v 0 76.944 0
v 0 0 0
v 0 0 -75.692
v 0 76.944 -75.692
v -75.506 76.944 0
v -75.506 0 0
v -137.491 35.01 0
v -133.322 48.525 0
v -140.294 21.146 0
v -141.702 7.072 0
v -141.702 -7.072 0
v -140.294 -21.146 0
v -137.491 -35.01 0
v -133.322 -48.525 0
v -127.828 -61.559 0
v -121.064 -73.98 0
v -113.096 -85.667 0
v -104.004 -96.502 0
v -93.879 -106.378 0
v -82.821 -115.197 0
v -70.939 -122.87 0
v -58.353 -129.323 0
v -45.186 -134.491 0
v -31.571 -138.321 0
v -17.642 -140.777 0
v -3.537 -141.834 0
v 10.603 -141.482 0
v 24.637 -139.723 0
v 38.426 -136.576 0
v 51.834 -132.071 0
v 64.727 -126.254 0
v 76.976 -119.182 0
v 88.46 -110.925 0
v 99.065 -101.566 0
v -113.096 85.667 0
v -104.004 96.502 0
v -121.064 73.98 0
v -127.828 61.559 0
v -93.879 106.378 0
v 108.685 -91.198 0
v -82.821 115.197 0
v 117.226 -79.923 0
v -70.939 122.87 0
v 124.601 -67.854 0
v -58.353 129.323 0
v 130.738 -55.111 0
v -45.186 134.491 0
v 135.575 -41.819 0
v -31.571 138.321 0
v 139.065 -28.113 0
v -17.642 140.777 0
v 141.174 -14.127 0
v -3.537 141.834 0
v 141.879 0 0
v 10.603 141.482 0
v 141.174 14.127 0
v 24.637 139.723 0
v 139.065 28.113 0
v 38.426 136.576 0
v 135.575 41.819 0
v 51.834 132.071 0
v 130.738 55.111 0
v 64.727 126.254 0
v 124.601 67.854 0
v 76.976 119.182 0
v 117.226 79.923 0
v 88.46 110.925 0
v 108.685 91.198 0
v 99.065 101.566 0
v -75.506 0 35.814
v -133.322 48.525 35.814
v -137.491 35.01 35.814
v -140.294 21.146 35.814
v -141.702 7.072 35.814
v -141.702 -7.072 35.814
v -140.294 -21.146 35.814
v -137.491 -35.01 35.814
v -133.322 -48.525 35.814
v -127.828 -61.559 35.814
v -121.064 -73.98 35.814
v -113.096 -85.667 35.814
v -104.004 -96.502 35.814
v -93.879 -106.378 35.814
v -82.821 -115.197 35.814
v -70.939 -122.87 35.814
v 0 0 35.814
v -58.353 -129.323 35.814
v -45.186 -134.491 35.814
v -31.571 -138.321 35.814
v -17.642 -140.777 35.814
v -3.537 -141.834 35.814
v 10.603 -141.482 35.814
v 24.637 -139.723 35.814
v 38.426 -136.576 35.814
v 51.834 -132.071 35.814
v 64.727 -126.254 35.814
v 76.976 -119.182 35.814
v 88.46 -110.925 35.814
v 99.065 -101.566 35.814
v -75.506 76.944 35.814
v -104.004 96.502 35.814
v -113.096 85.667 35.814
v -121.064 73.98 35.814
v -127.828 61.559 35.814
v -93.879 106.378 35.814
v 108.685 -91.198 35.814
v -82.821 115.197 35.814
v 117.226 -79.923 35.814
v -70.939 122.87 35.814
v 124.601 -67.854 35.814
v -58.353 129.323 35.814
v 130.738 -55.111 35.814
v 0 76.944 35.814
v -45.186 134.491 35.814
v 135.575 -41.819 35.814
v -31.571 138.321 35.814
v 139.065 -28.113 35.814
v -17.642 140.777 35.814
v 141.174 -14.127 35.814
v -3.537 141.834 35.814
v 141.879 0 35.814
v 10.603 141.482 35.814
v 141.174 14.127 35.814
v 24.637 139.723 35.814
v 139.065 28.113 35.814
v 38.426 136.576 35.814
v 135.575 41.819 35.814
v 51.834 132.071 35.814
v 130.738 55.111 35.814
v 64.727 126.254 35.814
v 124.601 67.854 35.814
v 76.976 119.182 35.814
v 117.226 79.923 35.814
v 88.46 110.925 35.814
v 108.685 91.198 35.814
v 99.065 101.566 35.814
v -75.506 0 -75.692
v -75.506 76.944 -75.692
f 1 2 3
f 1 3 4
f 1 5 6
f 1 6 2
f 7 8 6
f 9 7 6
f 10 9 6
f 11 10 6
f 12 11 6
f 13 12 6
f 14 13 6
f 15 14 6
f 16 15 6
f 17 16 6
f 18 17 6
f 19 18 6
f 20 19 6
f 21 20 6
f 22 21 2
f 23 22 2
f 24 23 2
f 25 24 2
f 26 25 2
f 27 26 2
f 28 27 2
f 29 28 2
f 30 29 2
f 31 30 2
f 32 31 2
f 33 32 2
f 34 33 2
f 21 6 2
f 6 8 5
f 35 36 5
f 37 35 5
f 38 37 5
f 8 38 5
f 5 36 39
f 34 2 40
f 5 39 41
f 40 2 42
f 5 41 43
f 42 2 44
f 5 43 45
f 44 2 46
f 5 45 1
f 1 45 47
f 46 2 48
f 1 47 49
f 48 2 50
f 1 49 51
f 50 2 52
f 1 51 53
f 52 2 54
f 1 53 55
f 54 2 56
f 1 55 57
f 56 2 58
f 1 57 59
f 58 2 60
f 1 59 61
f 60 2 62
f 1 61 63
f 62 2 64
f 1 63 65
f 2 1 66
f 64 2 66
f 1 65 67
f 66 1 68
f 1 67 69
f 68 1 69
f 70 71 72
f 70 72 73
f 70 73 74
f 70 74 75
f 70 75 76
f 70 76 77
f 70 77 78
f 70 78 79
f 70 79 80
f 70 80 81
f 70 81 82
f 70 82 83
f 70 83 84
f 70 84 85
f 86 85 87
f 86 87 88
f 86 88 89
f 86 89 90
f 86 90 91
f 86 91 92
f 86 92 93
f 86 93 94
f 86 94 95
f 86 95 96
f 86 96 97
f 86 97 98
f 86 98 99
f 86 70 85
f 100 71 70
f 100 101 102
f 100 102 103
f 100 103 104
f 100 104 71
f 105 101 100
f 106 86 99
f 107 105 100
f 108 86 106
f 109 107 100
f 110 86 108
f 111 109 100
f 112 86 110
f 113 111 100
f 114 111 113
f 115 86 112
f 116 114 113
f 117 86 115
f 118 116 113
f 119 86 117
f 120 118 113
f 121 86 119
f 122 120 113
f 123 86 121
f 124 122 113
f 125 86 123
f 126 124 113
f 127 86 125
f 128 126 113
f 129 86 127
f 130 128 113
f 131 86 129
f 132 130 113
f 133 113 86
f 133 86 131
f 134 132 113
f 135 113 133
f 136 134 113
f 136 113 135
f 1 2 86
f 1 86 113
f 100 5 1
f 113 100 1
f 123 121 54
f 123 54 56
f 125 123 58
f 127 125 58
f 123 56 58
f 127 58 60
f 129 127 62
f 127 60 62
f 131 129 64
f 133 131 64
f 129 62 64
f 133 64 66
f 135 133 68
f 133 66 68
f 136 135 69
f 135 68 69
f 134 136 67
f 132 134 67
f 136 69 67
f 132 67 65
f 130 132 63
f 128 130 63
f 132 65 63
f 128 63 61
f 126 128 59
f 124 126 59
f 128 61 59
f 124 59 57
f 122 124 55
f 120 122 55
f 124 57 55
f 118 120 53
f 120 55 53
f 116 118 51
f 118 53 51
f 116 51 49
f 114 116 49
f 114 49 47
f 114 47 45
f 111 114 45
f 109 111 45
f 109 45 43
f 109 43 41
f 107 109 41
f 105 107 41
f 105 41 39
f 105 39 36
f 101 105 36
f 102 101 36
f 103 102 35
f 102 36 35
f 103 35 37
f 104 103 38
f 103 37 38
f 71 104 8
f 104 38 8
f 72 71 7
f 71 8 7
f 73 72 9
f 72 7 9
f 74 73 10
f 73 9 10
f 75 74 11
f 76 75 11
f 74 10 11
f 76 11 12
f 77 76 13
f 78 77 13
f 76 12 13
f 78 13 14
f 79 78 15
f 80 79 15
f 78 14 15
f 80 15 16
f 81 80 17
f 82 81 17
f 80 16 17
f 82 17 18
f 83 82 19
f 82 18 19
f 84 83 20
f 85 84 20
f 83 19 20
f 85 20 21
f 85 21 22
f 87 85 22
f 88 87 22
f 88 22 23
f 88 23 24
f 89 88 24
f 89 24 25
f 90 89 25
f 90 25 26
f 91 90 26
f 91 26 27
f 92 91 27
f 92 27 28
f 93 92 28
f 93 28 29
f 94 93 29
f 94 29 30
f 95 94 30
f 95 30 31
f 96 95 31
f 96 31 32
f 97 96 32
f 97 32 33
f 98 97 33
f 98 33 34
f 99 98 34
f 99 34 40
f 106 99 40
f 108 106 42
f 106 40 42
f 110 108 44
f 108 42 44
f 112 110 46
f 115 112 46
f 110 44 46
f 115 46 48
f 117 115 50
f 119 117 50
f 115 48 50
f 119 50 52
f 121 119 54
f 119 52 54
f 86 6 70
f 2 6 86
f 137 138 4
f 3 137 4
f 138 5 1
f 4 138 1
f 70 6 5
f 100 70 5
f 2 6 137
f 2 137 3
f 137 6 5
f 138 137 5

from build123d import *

# Parameters (mm, degrees)
F0_W     = 75.5055472255
F0_H     = 76.9438669086
F1_DEPTH = 75.692
F2_R     = 141.8785482935
F2_W     = 75.5055472255
F2_H     = 76.9438669086
F3_DEPTH = 35.814
F4_W     = 74.154779315
F4_H     = 76.2271508574
F5_DEPTH = 25.4


with BuildPart() as f1:
    # F0 (on Top) → F1 (new body)
    with BuildSketch(Plane.XY):
        with Locations((-37.7527736127, 38.4719334543)):
            Rectangle(F0_W, F0_H)
    extrude(amount=-F1_DEPTH)



with BuildPart() as f3:
    # F2 (on face) → F3 (new body)
    with BuildSketch(Plane.XY):
        Circle(F2_R)
        with Locations((-37.7527736127, 38.4719334543)):
            Rectangle(F2_W, F2_H, mode=Mode.SUBTRACT)
    extrude(amount=F3_DEPTH)


with BuildPart() as f1_1:
    add(f1.part)

    add(f3.part)  # F5 merges F3
    # F4 (on face) → F5 (join)
    with BuildSketch(Plane(origin=(0, 0, 0), x_dir=(1, 0, 0), z_dir=(0, 0, -1))):
        Polygon((-75.5055472255, 0), (0, 0), (0, 76.2271508574), (-75.5516588688, 76.2271508574), (-75.5516588688, 0), align=None)
        with Locations((37.0773896575, 38.1135754287)):
            Rectangle(F4_W, F4_H)
    extrude(amount=-F5_DEPTH)


solid = f1_1.part
